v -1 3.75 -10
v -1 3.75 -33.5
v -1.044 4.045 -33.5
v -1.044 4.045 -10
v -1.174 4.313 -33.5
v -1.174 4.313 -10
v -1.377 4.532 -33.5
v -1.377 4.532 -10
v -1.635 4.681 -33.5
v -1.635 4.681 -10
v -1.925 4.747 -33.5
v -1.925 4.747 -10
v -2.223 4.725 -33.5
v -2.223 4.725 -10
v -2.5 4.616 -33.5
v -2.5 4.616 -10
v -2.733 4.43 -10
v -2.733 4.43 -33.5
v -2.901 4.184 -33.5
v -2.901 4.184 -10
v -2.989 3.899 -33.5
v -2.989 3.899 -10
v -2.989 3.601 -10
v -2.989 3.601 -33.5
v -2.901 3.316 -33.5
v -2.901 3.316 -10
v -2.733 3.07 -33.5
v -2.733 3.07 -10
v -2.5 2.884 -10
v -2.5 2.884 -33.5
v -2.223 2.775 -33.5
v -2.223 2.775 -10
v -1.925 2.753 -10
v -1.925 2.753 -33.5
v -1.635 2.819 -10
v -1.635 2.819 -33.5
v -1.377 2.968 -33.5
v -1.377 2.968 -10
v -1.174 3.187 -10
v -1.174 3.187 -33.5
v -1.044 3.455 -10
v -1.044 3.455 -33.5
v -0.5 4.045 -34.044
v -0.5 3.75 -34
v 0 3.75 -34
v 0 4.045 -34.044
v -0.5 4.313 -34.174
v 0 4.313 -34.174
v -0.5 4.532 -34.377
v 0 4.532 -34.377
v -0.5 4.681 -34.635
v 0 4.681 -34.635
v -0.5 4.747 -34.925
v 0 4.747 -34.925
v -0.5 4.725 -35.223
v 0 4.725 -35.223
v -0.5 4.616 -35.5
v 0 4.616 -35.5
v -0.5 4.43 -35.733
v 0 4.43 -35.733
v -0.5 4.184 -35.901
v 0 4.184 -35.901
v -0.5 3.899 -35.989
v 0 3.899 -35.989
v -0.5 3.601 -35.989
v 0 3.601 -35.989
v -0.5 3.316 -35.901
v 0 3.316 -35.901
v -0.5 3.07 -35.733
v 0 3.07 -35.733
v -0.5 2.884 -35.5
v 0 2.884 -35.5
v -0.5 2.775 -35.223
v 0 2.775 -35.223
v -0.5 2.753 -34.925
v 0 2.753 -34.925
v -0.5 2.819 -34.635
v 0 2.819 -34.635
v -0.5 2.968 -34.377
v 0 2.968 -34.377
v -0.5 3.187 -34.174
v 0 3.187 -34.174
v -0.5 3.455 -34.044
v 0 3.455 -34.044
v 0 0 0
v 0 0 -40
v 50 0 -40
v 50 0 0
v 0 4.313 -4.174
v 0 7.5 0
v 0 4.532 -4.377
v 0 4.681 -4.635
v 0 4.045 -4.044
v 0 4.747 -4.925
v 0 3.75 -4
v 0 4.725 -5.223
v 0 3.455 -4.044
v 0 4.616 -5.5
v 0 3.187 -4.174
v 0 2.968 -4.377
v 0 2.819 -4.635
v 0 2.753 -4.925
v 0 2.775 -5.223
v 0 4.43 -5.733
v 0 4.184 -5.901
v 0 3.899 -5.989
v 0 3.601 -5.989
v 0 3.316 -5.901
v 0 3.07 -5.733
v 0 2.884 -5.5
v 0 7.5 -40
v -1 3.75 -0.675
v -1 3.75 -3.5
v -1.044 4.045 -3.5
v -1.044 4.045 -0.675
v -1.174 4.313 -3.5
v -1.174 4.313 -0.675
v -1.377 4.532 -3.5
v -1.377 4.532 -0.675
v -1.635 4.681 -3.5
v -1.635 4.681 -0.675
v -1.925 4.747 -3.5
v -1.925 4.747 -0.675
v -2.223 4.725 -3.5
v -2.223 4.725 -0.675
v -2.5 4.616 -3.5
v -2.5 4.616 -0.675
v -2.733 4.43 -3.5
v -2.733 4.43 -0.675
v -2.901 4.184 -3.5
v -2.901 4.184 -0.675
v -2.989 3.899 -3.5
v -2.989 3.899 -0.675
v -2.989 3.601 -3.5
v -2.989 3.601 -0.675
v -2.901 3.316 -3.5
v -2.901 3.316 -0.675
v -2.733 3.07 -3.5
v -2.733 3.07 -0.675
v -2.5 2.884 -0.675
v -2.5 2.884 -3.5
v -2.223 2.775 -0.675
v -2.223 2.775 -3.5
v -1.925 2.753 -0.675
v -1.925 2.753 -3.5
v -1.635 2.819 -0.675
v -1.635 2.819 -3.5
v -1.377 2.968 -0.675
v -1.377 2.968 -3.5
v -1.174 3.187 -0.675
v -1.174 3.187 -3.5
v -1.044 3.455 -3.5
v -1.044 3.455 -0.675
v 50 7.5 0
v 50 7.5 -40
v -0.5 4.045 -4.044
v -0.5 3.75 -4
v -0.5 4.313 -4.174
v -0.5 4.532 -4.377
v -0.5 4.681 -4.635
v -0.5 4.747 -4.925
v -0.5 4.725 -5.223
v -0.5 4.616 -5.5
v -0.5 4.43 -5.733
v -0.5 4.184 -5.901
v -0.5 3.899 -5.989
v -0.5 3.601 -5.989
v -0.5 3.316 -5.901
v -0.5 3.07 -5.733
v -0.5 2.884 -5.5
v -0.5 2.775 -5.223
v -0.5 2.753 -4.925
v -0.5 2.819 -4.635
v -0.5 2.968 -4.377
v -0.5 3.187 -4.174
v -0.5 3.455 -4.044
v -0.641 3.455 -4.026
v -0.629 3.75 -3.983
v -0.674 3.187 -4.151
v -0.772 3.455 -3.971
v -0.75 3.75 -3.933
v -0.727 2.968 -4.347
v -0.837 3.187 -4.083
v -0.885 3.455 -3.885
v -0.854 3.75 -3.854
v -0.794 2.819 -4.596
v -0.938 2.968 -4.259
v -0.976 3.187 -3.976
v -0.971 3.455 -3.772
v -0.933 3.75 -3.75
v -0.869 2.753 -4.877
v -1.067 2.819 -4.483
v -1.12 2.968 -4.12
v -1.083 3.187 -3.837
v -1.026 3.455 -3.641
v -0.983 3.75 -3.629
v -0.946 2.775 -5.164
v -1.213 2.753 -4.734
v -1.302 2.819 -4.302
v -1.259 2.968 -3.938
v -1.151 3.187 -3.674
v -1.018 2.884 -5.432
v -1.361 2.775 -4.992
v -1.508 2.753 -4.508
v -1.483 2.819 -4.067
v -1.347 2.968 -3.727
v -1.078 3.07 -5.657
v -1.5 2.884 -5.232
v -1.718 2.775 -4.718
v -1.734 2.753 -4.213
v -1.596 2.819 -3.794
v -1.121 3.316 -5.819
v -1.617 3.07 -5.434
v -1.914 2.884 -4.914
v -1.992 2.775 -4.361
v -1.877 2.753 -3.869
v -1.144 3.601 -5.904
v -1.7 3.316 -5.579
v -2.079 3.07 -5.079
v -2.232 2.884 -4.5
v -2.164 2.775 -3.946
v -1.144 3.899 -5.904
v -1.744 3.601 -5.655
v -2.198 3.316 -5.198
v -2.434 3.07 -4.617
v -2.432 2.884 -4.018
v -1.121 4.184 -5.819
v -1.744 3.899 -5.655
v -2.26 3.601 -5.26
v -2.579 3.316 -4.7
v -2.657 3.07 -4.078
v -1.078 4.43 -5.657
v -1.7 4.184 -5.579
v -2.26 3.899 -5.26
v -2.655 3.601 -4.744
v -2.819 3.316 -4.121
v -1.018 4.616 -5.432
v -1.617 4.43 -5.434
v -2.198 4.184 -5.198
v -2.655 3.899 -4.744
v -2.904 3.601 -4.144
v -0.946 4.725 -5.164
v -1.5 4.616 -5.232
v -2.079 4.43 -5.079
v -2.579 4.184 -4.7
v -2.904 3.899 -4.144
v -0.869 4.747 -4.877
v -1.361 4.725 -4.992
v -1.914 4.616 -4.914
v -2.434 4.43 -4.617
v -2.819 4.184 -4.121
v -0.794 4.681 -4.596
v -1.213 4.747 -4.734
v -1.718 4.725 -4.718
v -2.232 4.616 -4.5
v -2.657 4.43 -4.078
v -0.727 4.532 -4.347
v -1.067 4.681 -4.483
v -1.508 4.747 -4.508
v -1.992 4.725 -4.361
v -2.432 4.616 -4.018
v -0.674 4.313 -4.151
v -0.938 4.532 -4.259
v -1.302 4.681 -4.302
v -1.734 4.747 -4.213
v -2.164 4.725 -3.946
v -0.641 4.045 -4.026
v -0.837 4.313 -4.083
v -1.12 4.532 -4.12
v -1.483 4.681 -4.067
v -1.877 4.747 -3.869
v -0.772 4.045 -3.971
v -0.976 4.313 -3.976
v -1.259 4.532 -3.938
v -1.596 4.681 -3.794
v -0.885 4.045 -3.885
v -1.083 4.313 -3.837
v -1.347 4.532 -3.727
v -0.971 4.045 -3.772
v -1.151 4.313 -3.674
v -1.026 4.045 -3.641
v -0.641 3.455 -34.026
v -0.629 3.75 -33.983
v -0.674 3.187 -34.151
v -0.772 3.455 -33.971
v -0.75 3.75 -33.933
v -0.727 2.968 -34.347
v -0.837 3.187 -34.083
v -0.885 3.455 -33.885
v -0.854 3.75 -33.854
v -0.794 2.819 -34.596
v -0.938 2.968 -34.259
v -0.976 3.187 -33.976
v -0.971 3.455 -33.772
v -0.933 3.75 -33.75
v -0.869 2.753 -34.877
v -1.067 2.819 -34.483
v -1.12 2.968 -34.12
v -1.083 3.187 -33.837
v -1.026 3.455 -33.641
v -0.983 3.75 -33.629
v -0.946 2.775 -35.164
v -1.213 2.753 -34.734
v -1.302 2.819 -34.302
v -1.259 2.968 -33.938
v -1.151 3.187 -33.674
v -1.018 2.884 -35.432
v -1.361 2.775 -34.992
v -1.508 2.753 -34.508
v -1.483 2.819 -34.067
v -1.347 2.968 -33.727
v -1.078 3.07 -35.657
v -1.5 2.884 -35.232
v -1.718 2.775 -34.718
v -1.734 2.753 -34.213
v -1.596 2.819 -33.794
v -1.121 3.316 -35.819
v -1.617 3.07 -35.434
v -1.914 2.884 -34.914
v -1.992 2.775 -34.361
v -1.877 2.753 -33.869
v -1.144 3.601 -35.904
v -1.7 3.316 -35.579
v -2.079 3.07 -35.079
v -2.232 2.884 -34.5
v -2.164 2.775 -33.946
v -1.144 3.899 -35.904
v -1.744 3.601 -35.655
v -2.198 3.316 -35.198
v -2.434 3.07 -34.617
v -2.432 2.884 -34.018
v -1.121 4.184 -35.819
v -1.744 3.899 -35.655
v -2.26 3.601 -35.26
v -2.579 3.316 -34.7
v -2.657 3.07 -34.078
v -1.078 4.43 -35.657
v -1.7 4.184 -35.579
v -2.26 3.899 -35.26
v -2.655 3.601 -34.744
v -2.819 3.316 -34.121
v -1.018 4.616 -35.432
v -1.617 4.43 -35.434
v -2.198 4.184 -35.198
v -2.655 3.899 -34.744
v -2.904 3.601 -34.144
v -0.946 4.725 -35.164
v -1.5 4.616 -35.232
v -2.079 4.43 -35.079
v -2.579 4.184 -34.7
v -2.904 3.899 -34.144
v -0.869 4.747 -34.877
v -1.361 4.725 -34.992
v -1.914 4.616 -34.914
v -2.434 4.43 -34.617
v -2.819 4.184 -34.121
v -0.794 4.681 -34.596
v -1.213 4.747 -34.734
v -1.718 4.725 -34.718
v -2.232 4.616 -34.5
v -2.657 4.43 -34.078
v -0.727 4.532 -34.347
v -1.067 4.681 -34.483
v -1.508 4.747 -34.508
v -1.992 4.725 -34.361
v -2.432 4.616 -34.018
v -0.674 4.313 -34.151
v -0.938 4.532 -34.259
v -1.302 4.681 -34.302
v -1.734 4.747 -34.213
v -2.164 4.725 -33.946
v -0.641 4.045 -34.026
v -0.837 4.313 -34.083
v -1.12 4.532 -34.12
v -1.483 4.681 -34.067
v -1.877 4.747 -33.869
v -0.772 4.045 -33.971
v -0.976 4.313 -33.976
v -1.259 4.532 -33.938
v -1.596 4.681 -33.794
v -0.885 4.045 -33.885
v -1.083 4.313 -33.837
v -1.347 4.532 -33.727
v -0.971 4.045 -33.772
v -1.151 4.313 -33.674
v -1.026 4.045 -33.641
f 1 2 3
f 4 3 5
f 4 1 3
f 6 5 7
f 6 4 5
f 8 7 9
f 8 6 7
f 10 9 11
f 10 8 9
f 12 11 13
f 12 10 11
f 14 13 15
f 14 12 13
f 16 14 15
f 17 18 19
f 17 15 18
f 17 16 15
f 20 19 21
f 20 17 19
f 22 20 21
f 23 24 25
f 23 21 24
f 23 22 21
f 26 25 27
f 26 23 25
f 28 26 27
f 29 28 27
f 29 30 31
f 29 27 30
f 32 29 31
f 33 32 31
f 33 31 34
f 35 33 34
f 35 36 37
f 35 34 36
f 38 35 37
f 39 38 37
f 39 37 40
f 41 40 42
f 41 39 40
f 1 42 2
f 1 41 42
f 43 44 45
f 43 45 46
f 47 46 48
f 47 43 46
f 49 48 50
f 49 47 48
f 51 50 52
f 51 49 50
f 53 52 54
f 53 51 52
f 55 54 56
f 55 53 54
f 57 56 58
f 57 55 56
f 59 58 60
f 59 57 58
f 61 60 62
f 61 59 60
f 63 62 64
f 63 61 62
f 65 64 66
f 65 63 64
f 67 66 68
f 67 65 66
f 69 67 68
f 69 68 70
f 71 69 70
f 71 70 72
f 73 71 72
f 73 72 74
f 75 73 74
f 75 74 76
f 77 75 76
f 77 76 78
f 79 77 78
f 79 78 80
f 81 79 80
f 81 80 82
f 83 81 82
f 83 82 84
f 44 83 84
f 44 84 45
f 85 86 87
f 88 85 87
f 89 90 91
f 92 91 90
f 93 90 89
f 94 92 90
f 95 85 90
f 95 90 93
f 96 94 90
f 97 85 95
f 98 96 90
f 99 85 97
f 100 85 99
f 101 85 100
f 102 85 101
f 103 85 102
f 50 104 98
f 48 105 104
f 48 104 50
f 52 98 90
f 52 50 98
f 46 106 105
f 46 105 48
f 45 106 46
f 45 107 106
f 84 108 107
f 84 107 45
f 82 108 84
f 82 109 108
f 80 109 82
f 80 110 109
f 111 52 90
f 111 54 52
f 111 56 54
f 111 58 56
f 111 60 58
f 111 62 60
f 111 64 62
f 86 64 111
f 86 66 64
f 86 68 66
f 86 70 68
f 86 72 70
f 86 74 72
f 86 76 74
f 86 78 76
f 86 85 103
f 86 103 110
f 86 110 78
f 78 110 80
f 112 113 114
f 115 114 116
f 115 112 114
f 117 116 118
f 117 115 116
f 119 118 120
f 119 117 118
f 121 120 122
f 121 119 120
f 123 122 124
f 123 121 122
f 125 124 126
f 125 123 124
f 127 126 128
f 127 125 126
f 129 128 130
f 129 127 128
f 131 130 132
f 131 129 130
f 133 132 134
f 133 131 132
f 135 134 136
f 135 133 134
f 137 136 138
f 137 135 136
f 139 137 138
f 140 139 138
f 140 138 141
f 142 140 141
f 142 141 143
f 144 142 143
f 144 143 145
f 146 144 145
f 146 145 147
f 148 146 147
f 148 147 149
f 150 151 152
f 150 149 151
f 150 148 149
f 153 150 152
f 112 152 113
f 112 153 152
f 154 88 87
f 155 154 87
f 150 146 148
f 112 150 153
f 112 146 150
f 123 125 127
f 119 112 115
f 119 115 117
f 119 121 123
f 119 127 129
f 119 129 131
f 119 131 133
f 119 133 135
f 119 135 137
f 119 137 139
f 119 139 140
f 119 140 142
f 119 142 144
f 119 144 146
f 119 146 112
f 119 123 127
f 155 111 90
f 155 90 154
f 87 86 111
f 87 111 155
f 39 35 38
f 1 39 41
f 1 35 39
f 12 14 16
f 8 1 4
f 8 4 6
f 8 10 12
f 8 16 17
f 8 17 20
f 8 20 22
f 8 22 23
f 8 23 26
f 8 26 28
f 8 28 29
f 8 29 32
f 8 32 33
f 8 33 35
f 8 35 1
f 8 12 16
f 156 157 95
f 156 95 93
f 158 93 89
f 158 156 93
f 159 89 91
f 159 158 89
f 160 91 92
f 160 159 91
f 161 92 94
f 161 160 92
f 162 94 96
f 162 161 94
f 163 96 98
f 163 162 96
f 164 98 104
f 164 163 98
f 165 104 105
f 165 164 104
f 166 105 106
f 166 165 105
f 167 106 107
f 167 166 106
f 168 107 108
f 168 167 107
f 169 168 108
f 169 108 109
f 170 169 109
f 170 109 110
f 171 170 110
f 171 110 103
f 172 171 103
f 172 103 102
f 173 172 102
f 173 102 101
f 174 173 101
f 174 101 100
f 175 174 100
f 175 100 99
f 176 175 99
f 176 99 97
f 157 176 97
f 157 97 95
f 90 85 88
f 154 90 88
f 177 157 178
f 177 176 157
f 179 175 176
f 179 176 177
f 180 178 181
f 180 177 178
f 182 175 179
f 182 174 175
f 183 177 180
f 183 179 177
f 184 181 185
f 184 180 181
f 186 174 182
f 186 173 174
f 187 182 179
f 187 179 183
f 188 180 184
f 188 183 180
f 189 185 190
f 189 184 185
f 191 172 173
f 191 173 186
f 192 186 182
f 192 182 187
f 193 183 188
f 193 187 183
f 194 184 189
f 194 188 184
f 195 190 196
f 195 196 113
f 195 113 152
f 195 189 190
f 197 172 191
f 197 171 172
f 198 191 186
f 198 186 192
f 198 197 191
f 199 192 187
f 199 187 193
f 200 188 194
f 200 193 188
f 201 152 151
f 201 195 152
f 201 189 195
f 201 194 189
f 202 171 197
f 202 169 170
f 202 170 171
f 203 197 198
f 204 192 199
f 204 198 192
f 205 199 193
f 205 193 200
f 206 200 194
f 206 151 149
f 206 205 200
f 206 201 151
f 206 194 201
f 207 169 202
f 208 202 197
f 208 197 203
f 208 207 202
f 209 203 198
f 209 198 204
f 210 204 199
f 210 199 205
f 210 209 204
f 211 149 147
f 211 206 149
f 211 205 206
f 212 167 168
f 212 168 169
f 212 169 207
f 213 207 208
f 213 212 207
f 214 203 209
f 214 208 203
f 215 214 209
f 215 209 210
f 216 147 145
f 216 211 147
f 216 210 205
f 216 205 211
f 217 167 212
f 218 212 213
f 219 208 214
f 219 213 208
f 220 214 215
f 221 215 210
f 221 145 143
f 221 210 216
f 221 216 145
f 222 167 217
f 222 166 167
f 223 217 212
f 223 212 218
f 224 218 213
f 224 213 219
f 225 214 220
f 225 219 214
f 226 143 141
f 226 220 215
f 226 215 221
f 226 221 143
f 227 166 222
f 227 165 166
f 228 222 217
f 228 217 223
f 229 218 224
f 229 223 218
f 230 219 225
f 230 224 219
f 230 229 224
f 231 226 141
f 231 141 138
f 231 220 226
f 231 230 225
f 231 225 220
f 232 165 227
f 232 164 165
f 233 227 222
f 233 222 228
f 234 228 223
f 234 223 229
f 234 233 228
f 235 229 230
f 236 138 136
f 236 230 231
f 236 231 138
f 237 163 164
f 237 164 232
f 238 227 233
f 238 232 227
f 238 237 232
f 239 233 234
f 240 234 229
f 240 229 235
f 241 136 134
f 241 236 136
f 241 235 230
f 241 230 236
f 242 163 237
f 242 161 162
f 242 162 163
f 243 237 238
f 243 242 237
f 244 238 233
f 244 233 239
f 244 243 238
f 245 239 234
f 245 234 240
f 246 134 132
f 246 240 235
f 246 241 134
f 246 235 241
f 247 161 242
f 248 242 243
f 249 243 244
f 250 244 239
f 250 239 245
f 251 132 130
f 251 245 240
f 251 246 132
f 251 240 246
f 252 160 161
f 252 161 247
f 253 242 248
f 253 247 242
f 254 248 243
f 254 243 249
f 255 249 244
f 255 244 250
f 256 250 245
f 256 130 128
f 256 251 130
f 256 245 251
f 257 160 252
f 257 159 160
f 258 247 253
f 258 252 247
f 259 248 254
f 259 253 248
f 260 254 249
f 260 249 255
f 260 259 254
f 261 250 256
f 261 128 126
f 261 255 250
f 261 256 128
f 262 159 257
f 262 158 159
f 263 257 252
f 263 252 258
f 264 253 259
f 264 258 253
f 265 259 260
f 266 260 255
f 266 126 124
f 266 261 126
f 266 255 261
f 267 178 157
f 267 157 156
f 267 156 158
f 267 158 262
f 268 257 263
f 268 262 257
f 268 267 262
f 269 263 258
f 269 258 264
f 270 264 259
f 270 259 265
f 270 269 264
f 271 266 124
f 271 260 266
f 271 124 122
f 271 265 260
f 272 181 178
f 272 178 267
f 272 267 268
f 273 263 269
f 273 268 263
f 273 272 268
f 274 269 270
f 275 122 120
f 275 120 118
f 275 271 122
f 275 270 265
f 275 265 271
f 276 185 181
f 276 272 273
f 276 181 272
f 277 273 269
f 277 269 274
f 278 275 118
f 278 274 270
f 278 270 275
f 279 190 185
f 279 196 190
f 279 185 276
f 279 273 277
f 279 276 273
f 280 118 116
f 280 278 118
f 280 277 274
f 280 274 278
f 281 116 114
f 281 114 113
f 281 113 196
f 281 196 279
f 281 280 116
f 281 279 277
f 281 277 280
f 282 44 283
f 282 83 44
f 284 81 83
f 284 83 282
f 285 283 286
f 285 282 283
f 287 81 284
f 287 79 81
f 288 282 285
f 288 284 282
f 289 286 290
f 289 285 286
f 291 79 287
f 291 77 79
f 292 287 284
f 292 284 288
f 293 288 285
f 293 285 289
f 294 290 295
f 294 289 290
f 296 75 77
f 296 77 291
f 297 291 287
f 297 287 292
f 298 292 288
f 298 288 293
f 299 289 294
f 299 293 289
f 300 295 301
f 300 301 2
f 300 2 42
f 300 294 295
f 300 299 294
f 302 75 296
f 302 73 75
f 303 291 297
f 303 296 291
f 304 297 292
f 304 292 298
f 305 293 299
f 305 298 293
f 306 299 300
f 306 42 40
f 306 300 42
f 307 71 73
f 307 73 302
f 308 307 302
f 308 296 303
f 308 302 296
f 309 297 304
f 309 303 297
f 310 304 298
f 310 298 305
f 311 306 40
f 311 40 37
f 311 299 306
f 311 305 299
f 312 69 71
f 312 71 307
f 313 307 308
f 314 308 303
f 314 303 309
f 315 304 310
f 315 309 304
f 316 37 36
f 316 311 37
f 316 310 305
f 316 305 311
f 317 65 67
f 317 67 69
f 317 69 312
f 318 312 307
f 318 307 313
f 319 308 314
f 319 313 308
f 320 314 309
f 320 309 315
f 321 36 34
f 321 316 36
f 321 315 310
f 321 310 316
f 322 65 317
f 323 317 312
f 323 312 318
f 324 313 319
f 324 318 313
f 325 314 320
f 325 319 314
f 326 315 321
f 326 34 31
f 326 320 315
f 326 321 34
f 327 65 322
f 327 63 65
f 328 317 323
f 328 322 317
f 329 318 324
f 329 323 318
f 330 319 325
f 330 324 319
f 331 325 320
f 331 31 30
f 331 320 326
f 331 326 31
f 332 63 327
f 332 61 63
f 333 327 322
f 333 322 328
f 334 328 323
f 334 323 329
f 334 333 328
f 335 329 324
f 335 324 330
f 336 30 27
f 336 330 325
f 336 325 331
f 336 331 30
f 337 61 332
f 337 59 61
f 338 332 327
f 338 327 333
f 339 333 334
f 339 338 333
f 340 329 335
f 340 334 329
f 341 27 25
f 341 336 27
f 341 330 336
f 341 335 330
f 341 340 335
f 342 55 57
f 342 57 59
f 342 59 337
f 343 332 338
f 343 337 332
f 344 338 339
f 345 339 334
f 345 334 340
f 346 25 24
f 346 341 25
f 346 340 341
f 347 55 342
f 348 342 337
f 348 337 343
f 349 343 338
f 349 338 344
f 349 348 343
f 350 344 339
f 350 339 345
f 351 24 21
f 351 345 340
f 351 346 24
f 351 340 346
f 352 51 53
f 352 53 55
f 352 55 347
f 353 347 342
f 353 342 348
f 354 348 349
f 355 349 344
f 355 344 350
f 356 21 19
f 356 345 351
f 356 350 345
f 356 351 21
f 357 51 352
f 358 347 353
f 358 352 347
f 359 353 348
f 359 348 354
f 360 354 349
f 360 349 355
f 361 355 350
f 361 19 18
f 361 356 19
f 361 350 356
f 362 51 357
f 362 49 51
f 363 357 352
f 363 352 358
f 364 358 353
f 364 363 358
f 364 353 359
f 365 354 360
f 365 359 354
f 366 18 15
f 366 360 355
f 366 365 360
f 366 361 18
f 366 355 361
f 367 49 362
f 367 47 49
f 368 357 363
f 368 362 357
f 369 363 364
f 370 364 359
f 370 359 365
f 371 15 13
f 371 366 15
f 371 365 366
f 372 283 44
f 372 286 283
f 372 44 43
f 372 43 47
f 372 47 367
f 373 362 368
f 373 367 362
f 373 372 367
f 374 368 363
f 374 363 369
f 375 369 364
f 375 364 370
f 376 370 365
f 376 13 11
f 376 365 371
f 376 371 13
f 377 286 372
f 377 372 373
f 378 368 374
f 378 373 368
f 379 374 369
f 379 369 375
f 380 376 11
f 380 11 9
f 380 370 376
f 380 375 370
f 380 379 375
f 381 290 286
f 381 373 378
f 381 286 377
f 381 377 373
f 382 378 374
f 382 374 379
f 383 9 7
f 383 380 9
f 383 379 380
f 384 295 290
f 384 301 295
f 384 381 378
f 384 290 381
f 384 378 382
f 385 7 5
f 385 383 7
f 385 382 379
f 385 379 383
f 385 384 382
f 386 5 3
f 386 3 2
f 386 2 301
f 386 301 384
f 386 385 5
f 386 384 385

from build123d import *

# Parameters (mm, degrees)
SKETCH1_W           = 50
SKETCH1_H           = 40.00000001
BOSS_EXTRUDE1_DEPTH = 7.5
SKETCH2_R           = 1
SKETCH4_R           = 1


with BuildPart() as part:
    # Sketch1 → Boss-Extrude1 (new body)
    with BuildSketch(Plane(origin=(0, 0, 0), x_dir=(1, 0, 0), z_dir=(0, 1, 0))):
        with Locations((25, 20.000000005)):
            Rectangle(SKETCH1_W, SKETCH1_H)
    extrude(amount=BOSS_EXTRUDE1_DEPTH)

    # Sweep1: sweep along a path in Sketch3
    with BuildLine(Plane(origin=(0, 3.75, 0), x_dir=(1, 0, 0), z_dir=(0, 1, 0))) as sweep1_path:
        Line((0, 35.000000005), (-0.5, 35.000000005))
        ThreePointArc((-0.5, 35.000000005), (-1.560660172, 34.560660177), (-2, 33.500000005))
        Line((-2, 33.500000005), (-2, 10.000000005))
    # Sketch2 → Sweep1 (sweep)
    with BuildSketch(Plane.ZY):
        with Locations((-35.000000005, 3.75)):
            Circle(SKETCH2_R)
    sweep(path=sweep1_path.line)

    # Sweep2: sweep along a path in Sketch5
    with BuildLine(Plane(origin=(0, 3.75, 0), x_dir=(1, 0, 0), z_dir=(0, 1, 0))) as sweep2_path:
        Line((0, 5), (-0.5, 5))
        ThreePointArc((-0.5, 5), (-1.560660172, 4.560660172), (-2, 3.5))
        Line((-2, 3.5), (-2, 0.674549329))
    # Sketch4 → Sweep2 (sweep)
    with BuildSketch(Plane.ZY):
        with Locations((-5, 3.75)):
            Circle(SKETCH4_R)
    sweep(path=sweep2_path.line)


solid = part.part
